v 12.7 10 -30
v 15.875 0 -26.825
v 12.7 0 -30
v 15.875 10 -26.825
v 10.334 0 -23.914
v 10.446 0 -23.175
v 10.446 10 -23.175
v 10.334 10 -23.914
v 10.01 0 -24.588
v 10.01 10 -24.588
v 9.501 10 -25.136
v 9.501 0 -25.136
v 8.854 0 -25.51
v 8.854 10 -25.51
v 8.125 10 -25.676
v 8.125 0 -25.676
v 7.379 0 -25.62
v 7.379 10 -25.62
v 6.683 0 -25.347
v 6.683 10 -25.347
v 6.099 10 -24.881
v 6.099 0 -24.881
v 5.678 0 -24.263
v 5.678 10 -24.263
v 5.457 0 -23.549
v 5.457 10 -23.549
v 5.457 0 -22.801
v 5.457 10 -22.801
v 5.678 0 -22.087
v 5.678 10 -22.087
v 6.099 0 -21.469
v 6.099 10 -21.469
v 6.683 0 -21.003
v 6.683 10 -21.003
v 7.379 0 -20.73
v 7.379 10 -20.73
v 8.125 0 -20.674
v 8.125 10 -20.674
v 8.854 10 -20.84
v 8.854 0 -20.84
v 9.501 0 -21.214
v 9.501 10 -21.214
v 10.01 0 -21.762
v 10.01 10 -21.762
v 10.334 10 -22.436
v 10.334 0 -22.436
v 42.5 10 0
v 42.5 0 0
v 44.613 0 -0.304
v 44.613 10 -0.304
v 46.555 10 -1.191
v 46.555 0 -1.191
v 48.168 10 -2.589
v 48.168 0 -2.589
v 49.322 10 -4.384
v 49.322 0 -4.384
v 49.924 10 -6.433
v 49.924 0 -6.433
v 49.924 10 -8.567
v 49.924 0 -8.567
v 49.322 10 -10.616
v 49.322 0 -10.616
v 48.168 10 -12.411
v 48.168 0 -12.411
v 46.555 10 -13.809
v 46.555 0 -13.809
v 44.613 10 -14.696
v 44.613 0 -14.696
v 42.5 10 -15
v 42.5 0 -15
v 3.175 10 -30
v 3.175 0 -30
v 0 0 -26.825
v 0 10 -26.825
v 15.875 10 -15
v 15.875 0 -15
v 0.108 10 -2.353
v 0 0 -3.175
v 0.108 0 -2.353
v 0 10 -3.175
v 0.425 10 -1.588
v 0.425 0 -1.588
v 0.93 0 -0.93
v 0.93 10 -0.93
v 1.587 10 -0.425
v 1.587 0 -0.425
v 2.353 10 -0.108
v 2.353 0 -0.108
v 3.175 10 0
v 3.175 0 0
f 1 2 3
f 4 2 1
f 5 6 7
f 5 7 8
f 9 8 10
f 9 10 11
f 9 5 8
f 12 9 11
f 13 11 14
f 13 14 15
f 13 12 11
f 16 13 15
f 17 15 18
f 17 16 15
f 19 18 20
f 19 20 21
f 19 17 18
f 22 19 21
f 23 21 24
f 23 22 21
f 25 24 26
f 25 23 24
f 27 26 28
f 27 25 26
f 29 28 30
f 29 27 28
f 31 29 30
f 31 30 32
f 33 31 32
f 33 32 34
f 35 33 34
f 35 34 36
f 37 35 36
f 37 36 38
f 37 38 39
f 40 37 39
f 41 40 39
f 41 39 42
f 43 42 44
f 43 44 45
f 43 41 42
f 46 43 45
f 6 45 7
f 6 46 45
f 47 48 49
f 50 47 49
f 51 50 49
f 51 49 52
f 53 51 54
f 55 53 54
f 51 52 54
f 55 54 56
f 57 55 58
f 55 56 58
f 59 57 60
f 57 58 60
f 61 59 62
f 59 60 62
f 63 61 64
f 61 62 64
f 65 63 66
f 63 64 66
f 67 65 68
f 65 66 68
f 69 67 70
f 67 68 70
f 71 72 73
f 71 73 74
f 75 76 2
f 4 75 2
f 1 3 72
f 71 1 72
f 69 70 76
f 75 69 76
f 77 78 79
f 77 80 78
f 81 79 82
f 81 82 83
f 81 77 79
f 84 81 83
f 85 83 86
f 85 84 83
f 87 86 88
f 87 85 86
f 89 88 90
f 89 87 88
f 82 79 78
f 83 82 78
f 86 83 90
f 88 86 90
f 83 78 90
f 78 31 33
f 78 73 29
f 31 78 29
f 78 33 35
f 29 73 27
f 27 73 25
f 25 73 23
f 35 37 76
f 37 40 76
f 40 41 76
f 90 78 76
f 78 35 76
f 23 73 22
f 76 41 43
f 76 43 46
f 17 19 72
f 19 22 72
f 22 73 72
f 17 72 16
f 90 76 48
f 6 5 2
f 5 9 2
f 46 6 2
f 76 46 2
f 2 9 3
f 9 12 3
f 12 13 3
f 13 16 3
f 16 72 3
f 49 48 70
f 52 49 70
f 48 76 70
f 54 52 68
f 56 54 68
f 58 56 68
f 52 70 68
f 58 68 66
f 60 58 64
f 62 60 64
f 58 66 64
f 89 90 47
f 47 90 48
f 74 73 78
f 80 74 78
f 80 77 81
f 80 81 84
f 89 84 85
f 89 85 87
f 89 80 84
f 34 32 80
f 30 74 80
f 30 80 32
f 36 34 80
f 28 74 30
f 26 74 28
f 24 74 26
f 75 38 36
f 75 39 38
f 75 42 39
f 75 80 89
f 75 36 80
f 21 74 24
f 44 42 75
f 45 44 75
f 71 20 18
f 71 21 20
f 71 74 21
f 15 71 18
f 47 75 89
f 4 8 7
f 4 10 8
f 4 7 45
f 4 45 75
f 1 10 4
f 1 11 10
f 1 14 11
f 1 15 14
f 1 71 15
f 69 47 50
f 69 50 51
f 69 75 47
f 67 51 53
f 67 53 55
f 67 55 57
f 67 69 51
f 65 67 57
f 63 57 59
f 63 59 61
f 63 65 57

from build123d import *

# Parameters (mm, degrees)
SKETCH1_R           = 2.50825
BOSS_EXTRUDE1_DEPTH = 10
FILLET1_R           = 3.175
CHAMFER1_SIZE       = 3.175


with BuildPart() as part:
    # Sketch1 → Boss-Extrude1 (new body)
    with BuildSketch(Plane(origin=(0, 0, 0), x_dir=(1, 0, 0), z_dir=(0, 1, 0))):
        with BuildLine():
            Line((0, 30), (0, 0))
            Line((0, 0), (42.5, 0))
            ThreePointArc((42.5, 0), (50, 7.5), (42.5, 15))
            Line((42.5, 15), (15.875, 15))
            Line((15.875, 15), (15.875, 30))
            Line((15.875, 30), (0, 30))
        make_face()
        with Locations((7.9375, 23.175)):
            Circle(SKETCH1_R, mode=Mode.SUBTRACT)
    extrude(amount=BOSS_EXTRUDE1_DEPTH)

    # Fillet1
    fillet1_edges = [part.edges().sort_by_distance(p)[0] for p in [
        (0, 5, 0),
    ]]
    fillet(fillet1_edges, radius=FILLET1_R)

    # Chamfer1
    chamfer1_edges = [part.edges().sort_by_distance(p)[0] for p in [
        (15.875, 5, -30),
        (0, 5, -30),
    ]]
    chamfer(chamfer1_edges, length=CHAMFER1_SIZE)


solid = part.part
